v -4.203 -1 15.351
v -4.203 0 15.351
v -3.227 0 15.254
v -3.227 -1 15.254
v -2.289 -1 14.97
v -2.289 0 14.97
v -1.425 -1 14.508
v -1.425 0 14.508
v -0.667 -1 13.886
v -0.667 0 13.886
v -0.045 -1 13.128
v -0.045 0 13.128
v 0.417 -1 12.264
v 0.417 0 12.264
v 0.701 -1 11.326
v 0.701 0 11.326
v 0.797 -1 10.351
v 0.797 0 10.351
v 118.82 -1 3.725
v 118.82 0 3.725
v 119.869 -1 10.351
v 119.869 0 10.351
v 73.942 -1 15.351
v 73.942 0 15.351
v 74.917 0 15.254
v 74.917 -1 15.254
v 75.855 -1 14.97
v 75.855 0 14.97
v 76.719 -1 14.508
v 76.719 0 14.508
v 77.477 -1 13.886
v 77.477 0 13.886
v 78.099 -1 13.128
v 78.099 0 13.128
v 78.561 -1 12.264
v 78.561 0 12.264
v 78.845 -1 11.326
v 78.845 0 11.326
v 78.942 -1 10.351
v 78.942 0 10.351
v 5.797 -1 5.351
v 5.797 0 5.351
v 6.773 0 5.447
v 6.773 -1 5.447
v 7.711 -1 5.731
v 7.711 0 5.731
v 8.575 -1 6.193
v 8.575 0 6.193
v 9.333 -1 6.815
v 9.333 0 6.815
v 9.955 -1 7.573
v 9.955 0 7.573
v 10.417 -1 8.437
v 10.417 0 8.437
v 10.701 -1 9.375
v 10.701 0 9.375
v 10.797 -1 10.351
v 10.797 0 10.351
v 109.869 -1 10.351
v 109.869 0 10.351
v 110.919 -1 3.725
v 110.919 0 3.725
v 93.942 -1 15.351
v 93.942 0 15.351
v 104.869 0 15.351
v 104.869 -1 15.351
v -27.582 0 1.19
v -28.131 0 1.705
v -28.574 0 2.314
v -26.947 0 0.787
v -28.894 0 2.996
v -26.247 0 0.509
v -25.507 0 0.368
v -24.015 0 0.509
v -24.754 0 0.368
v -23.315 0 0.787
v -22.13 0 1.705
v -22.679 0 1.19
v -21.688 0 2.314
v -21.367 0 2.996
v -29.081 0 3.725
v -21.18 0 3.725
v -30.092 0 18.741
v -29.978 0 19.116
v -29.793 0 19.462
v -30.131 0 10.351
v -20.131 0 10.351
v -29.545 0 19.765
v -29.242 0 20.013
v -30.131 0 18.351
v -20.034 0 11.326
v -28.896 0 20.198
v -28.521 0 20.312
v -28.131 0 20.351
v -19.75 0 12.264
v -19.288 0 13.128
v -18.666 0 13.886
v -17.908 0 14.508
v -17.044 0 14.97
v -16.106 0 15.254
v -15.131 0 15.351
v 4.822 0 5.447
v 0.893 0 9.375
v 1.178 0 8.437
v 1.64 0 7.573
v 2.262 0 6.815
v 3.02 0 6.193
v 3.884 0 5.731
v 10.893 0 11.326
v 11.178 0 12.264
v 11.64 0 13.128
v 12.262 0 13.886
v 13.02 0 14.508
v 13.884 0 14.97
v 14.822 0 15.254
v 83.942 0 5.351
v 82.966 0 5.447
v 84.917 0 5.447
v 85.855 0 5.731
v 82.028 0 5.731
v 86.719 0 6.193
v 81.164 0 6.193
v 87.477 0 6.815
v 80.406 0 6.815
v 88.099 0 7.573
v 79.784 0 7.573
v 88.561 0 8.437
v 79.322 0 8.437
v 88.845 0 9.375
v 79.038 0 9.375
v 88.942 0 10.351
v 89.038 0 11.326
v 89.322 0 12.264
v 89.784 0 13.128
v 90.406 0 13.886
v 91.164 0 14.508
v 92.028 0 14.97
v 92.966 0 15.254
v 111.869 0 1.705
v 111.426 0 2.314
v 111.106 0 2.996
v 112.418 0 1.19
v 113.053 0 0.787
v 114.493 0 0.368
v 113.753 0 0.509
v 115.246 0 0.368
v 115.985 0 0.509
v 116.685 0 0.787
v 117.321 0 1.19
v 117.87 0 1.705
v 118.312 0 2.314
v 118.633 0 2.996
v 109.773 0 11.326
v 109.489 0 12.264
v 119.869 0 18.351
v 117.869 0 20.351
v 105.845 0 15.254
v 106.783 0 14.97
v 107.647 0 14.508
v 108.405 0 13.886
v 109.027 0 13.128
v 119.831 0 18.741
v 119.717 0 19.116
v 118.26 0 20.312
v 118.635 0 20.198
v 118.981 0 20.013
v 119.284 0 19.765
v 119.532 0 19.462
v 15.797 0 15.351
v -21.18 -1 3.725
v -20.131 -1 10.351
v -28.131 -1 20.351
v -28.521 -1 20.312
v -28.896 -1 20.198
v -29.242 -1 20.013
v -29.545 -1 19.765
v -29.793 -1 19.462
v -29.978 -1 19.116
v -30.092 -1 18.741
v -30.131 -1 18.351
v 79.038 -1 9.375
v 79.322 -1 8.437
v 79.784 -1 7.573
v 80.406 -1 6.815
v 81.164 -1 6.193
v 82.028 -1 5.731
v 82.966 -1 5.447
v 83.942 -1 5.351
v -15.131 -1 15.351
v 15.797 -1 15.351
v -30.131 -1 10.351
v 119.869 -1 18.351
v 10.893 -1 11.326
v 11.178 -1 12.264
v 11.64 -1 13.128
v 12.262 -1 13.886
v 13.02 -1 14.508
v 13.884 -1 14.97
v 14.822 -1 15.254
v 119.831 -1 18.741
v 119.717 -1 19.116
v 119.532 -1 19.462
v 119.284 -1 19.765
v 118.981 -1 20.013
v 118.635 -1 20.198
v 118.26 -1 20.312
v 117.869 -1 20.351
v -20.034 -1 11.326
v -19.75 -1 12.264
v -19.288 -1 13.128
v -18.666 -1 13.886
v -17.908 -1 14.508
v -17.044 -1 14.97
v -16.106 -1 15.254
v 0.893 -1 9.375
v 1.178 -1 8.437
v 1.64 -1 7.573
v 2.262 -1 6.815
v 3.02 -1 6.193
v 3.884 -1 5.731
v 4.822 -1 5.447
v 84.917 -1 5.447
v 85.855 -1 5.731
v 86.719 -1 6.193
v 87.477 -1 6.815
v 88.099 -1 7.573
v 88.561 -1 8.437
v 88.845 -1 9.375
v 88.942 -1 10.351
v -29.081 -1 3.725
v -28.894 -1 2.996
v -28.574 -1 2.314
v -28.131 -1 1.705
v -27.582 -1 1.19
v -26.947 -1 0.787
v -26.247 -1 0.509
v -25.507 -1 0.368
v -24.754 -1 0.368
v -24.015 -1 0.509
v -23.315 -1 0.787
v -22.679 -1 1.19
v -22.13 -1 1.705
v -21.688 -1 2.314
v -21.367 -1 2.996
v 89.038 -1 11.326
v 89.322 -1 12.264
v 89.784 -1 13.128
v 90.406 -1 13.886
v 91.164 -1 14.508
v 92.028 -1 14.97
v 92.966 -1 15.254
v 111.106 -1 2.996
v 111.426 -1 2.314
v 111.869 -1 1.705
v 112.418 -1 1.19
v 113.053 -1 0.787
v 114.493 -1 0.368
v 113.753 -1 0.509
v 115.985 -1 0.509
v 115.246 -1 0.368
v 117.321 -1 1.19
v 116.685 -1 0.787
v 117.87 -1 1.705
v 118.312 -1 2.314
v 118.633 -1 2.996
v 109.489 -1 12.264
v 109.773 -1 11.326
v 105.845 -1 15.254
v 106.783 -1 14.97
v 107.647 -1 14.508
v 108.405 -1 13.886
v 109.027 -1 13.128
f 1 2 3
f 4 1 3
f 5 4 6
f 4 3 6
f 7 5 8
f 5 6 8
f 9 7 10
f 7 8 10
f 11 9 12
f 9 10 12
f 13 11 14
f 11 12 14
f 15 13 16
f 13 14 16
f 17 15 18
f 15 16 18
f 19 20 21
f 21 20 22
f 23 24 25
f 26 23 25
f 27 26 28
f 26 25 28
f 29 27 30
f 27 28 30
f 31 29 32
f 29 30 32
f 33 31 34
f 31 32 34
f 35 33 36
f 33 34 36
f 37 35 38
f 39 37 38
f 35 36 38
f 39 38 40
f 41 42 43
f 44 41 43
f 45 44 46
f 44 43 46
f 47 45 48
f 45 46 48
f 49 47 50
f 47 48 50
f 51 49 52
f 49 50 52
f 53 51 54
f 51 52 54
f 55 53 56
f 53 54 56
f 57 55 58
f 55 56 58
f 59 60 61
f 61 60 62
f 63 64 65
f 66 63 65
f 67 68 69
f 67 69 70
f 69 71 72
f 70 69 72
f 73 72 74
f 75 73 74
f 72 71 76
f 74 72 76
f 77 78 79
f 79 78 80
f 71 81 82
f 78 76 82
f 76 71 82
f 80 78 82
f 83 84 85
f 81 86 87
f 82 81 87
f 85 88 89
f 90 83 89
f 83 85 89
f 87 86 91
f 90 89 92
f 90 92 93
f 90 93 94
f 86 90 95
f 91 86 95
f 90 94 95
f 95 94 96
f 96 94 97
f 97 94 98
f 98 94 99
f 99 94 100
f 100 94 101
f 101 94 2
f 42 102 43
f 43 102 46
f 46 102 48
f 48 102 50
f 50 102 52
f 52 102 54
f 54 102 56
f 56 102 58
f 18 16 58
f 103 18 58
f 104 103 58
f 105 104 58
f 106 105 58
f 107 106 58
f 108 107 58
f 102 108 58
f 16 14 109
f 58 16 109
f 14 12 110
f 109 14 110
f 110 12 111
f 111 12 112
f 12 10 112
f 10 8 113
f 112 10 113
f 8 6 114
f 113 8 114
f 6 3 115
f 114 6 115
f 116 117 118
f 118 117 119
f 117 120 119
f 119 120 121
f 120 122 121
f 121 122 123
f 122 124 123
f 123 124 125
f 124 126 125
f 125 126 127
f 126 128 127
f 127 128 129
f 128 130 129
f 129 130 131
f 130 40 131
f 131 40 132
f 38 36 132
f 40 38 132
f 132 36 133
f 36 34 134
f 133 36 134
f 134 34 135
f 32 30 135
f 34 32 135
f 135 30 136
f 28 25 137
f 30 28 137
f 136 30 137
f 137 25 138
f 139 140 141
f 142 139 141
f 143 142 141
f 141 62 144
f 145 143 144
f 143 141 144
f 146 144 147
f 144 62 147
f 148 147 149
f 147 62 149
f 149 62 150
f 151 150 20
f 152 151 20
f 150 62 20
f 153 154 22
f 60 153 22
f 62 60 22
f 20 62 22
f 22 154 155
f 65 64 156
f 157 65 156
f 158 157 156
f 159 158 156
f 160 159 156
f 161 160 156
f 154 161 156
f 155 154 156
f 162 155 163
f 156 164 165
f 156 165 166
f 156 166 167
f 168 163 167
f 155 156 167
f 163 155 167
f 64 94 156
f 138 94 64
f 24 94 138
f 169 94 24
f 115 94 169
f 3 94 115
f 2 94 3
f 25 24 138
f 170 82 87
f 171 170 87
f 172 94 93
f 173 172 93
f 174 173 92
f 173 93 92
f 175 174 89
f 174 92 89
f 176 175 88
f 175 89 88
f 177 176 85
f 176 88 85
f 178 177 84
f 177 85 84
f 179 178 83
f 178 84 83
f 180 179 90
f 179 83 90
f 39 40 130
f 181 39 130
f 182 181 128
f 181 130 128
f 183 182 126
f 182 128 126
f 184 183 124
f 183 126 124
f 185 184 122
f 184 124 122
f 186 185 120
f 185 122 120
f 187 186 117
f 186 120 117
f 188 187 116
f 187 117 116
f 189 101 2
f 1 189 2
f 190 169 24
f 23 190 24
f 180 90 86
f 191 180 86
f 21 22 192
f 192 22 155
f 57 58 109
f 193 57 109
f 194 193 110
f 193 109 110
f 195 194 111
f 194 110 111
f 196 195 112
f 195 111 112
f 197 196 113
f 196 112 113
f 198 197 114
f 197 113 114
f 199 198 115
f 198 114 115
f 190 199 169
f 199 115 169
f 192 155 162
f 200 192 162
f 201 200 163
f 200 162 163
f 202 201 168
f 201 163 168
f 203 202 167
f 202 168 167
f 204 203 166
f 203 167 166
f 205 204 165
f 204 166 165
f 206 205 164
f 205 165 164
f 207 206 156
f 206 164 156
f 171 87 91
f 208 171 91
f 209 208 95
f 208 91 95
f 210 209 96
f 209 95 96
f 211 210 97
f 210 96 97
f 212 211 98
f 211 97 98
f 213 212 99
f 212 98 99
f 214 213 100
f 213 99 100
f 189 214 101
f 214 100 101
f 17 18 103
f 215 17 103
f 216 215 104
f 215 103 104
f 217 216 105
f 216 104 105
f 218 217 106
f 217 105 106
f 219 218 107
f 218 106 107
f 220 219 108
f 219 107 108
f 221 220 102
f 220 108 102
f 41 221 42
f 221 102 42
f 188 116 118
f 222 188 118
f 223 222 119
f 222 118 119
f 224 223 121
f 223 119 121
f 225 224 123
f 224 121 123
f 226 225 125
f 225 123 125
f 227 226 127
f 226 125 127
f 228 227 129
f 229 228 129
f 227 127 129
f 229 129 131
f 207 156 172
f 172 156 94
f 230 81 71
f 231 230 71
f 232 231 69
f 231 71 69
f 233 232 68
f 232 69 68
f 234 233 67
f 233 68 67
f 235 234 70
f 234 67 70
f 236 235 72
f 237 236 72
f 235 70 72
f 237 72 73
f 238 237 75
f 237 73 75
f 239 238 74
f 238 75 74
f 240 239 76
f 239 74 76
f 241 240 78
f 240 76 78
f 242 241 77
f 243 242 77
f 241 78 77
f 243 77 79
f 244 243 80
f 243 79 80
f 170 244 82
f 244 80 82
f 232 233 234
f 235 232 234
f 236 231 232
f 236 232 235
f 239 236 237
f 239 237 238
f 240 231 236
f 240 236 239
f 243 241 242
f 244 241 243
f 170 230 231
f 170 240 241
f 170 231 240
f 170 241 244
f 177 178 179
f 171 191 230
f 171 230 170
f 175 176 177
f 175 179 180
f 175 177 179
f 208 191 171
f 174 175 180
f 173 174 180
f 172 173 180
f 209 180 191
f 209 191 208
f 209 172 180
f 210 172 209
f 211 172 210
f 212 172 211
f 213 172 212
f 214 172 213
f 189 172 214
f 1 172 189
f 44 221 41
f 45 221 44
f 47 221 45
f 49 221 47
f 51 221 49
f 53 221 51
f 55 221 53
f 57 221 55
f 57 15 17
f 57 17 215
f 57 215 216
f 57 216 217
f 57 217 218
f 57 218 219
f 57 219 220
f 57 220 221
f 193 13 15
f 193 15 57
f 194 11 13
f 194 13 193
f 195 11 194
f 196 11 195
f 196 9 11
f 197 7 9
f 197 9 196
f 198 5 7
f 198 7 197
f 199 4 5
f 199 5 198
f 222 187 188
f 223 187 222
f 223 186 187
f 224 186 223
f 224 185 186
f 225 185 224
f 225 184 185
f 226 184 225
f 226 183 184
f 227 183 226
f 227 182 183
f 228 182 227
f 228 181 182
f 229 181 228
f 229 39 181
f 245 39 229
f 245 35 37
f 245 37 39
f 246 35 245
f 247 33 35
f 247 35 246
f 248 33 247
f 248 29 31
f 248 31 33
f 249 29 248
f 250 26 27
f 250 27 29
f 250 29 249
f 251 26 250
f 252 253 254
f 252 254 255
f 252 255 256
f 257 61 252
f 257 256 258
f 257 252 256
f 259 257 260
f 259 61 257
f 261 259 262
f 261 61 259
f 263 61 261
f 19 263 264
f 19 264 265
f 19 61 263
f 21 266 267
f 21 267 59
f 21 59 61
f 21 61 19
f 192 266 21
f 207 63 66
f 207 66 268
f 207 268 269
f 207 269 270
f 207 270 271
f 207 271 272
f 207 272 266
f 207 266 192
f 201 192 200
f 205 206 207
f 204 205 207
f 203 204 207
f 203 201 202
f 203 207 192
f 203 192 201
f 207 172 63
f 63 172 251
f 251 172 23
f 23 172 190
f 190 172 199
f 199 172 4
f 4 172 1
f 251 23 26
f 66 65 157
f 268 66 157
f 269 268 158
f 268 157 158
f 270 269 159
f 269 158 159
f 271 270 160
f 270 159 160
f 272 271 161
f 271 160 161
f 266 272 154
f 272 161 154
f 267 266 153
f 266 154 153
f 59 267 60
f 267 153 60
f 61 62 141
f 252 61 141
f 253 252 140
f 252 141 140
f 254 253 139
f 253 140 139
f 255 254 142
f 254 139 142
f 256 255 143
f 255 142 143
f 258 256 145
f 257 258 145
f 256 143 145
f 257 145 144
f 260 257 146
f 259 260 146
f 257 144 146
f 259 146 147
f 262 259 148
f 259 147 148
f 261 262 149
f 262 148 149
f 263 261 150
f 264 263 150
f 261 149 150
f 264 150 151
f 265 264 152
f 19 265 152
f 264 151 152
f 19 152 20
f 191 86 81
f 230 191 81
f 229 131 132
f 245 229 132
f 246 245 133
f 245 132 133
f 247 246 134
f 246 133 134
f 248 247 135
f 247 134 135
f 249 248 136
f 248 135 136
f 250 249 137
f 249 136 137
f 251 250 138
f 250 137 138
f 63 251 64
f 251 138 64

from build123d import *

# Parameters (mm, degrees)
F1_DEPTH = 1


with BuildPart() as f1:
    # F0 (on Front) → F1 (new body)
    with BuildSketch(Plane.XZ):
        with BuildLine():
            Line((29.8694758117, 20.3505297415), (-28.1305241883, 20.3505297415))
            ThreePointArc((-28.1305241883, 20.3505297415), (-29.5447377507, 19.7647433039), (-30.1305241883, 18.3505297415))
            Line((-30.1305241883, 18.3505297415), (-30.1305241883, 10.3505297415))
            Line((-30.1305241883, 10.3505297415), (-29.0812929486, 3.7248891079))
            ThreePointArc((-29.0812929486, 3.7248891079), (-25.1305241883, 0.3505297415), (-21.179755428, 3.7248891079))
            Line((-21.179755428, 3.7248891079), (-20.1305241883, 10.3505297415))
            ThreePointArc((-20.1305241883, 10.3505297415), (-18.6660580942, 13.8860636474), (-15.1305241883, 15.3505297415))
            Line((-15.1305241883, 15.3505297415), (-13.2839401439, 15.3505297415))
            Line((-13.2839401439, 15.3505297415), (-4.2025822867, 15.3505297415))
            ThreePointArc((-4.2025822867, 15.3505297415), (-0.6670483807, 13.8860636474), (0.7974177133, 10.3505297415))
            ThreePointArc((0.7974177133, 10.3505297415), (2.2618838074, 6.8149958356), (5.7974177133, 5.3505297415))
            ThreePointArc((5.7974177133, 5.3505297415), (9.3329516193, 6.8149958356), (10.7974177133, 10.3505297415))
            ThreePointArc((10.7974177133, 10.3505297415), (12.2618838074, 13.8860636474), (15.7974177133, 15.3505297415))
            Line((15.7974177133, 15.3505297415), (27.8694758117, 15.3505297415))
            Line((27.8694758117, 15.3505297415), (61.8694758117, 15.3505297415))
            Line((61.8694758117, 15.3505297415), (73.9415339101, 15.3505297415))
            ThreePointArc((73.9415339101, 15.3505297415), (77.477067816, 13.8860636474), (78.9415339101, 10.3505297415))
            ThreePointArc((78.9415339101, 10.3505297415), (80.4060000042, 6.8149958356), (83.9415339101, 5.3505297415))
            ThreePointArc((83.9415339101, 5.3505297415), (87.477067816, 6.8149958356), (88.9415339101, 10.3505297415))
            ThreePointArc((88.9415339101, 10.3505297415), (90.4060000042, 13.8860636474), (93.9415339101, 15.3505297415))
            Line((93.9415339101, 15.3505297415), (103.0228917673, 15.3505297415))
            Line((103.0228917673, 15.3505297415), (104.8694758117, 15.3505297415))
            ThreePointArc((104.8694758117, 15.3505297415), (108.4050097177, 13.8860636474), (109.8694758117, 10.3505297415))
            Line((109.8694758117, 10.3505297415), (110.9187070514, 3.7248891079))
            ThreePointArc((110.9187070514, 3.7248891079), (114.8694758117, 0.3505297415), (118.820244572, 3.7248891079))
            Line((118.820244572, 3.7248891079), (119.8694758117, 10.3505297415))
            Line((119.8694758117, 10.3505297415), (119.8694758117, 18.3505297415))
            ThreePointArc((119.8694758117, 18.3505297415), (119.2836893741, 19.7647433039), (117.8694758117, 20.3505297415))
            Line((117.8694758117, 20.3505297415), (59.8694758117, 20.3505297415))
            Line((59.8694758117, 20.3505297415), (29.8694758117, 20.3505297415))
        make_face()
    extrude(amount=F1_DEPTH)


solid = f1.part
